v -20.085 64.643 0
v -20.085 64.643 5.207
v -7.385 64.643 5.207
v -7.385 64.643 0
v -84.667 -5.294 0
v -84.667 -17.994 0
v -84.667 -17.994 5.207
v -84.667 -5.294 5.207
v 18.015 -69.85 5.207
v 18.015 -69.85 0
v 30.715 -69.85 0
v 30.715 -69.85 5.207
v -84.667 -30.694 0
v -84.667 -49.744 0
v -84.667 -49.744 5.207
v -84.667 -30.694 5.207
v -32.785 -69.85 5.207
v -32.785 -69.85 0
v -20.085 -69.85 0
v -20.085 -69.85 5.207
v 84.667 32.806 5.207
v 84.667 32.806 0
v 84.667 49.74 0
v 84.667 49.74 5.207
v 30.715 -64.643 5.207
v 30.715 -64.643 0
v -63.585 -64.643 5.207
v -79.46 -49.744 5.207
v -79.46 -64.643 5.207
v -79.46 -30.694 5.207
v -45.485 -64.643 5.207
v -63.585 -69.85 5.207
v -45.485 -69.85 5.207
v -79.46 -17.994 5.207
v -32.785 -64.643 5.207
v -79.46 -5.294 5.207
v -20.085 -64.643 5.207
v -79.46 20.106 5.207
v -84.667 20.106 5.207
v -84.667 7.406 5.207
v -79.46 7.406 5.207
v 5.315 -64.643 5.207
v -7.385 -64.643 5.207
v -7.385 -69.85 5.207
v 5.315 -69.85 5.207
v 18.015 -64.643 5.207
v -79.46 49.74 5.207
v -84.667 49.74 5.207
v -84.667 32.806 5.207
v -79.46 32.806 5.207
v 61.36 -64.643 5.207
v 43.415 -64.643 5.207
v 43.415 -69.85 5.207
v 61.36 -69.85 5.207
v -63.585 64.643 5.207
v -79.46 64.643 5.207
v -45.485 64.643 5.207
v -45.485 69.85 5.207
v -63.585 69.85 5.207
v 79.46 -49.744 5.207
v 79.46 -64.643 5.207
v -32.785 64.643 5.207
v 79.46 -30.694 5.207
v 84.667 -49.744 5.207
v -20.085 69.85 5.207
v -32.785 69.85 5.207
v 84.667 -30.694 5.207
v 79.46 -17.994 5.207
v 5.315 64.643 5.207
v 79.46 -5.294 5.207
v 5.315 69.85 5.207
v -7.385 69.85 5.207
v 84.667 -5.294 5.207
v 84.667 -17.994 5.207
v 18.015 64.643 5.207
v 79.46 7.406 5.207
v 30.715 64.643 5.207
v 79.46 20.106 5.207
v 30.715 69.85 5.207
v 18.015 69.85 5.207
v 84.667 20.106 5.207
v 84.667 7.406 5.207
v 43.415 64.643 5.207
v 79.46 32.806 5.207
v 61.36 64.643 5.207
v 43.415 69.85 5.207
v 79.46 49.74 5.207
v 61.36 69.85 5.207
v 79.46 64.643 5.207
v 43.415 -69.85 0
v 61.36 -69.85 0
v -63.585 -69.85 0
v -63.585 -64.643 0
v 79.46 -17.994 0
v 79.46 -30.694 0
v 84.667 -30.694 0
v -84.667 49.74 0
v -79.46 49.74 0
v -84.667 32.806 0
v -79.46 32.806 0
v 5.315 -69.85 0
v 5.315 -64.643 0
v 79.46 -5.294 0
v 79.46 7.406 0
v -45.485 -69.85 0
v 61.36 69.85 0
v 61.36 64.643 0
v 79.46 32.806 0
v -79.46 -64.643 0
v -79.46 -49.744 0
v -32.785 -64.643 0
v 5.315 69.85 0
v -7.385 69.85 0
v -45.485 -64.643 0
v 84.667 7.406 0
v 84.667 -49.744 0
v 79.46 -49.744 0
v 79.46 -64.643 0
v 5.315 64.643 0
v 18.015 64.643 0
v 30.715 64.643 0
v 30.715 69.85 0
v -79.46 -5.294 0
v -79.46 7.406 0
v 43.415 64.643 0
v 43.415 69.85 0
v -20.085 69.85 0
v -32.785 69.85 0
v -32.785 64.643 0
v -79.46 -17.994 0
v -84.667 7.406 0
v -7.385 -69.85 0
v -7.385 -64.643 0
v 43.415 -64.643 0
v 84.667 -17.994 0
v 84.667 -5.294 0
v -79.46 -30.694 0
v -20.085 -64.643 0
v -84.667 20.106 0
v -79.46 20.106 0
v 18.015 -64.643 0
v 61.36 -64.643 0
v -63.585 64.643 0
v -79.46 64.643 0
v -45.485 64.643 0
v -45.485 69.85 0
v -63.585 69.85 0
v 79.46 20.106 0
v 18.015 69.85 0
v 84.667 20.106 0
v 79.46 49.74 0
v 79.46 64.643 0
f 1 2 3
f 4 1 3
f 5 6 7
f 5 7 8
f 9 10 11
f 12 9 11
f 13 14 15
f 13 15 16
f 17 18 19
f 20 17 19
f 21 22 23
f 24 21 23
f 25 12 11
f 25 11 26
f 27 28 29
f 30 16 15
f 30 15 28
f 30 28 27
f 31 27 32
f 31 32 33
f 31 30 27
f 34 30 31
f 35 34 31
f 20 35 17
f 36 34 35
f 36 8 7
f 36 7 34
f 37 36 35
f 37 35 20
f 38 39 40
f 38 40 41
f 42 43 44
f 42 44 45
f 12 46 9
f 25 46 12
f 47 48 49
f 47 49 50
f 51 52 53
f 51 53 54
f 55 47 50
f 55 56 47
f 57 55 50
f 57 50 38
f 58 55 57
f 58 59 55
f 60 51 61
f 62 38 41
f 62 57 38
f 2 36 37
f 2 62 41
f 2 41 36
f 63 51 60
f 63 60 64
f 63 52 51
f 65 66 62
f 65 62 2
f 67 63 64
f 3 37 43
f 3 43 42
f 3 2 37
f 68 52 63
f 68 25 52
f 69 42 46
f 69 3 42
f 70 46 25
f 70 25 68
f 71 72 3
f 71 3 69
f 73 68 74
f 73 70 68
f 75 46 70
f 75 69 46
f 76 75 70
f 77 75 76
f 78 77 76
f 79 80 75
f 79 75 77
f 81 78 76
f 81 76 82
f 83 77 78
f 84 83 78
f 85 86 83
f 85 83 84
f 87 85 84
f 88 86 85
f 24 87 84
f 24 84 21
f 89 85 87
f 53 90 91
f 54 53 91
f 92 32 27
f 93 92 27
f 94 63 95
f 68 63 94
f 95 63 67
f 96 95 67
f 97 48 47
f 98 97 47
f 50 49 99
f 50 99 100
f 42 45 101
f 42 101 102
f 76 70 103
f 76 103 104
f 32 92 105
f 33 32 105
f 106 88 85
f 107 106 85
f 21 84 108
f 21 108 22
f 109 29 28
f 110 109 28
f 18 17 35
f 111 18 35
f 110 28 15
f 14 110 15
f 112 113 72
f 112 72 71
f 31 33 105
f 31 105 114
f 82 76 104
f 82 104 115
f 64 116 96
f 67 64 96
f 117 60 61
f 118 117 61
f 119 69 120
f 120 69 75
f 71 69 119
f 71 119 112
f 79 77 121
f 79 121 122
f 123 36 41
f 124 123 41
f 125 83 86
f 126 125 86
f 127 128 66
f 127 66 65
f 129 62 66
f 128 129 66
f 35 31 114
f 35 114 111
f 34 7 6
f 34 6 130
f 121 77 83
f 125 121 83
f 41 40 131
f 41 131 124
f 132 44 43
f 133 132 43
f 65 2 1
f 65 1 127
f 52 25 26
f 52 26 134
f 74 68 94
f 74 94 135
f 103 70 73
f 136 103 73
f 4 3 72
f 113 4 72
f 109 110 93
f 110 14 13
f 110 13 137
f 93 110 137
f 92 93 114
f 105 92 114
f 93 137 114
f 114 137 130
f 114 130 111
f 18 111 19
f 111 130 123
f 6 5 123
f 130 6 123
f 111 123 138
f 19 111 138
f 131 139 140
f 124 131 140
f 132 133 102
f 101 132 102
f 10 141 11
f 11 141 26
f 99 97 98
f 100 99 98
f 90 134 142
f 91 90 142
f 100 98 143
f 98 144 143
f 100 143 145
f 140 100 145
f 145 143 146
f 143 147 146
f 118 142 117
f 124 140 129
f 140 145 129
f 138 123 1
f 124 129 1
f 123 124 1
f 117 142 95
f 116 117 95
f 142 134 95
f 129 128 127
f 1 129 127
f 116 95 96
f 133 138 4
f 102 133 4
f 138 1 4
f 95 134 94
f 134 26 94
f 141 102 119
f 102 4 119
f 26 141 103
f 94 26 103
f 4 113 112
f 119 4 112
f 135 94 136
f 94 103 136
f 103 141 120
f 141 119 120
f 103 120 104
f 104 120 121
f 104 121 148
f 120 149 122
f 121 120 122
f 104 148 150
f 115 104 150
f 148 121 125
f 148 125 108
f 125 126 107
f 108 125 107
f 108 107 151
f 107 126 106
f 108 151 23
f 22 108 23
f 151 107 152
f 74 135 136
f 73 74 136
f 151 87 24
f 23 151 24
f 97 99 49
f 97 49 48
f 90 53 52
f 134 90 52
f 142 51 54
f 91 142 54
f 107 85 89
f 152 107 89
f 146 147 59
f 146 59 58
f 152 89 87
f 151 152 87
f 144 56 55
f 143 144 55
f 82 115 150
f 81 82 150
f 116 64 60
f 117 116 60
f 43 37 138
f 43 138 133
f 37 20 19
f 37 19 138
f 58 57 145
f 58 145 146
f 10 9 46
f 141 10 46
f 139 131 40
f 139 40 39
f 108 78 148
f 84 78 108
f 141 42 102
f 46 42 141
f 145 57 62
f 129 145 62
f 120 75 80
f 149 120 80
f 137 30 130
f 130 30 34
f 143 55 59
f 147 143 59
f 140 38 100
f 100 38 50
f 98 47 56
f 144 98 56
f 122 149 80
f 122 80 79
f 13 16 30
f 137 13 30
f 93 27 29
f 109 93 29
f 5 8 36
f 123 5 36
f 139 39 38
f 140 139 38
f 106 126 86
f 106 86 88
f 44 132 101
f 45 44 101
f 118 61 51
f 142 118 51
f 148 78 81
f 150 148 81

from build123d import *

# Parameters (mm, degrees)
F0_W     = 169.333316
F0_H     = 139.7
F1_DEPTH = 5.207
F2_W     = 5.207
F2_H     = 12.7
F2_W_2   = 12.7
F2_H_2   = 5.207
F3_DEPTH = 5.208


with BuildPart() as f1:
    # F0 (on Top) → F1 (new body)
    with BuildSketch(Plane.XY):
        Rectangle(F0_W, F0_H)
    extrude(amount=F1_DEPTH)

    # F2 (on face) → F3 (cut, through all)
    with BuildSketch(Plane.XY.offset(5.207)):
        Polygon((-79.459658, 49.73955), (-79.459658, 64.643), (-63.584658, 64.643), (-63.584658, 69.85), (-84.666658, 69.85), (-84.666658, 49.73955), align=None)
        with Locations((-82.063158, 26.456386)):
            Rectangle(F2_W, F2_H)
        with Locations((-82.063158, 1.056386)):
            Rectangle(F2_W, F2_H)
        with Locations((-82.063158, -24.343614)):
            Rectangle(F2_W, F2_H)
        Polygon((-79.459658, -49.743614), (-84.666658, -49.743614), (-84.666658, -69.85), (-63.584658, -69.85), (-63.584658, -64.643), (-79.459658, -64.643), align=None)
        with Locations((-39.13505, -67.2465)):
            Rectangle(F2_W_2, F2_H_2)
        with Locations((-13.73505, -67.2465)):
            Rectangle(F2_W_2, F2_H_2)
        with Locations((11.66495, -67.2465)):
            Rectangle(F2_W_2, F2_H_2)
        with Locations((37.06495, -67.2465)):
            Rectangle(F2_W_2, F2_H_2)
        Polygon((61.36005, -64.643), (61.36005, -69.85), (84.666658, -69.85), (84.666658, -49.743783), (79.459658, -49.743783), (79.459658, -64.643), align=None)
        with Locations((82.063158, -24.343783)):
            Rectangle(F2_W, F2_H)
        with Locations((82.063158, 1.056217)):
            Rectangle(F2_W, F2_H)
        Polygon((84.666658, 69.85), (61.36005, 69.85), (61.36005, 64.643), (79.459658, 64.643), (79.459658, 49.73955), (84.666658, 49.73955), align=None)
        with Locations((37.06495, 67.2465)):
            Rectangle(F2_W_2, F2_H_2)
        with Locations((11.66495, 67.2465)):
            Rectangle(F2_W_2, F2_H_2)
        with Locations((82.063158, 26.456217)):
            Rectangle(F2_W, F2_H)
        with Locations((-13.73505, 67.2465)):
            Rectangle(F2_W_2, F2_H_2)
        with Locations((-39.13505, 67.2465)):
            Rectangle(F2_W_2, F2_H_2)
    extrude(amount=-F3_DEPTH, mode=Mode.SUBTRACT)


solid = f1.part
